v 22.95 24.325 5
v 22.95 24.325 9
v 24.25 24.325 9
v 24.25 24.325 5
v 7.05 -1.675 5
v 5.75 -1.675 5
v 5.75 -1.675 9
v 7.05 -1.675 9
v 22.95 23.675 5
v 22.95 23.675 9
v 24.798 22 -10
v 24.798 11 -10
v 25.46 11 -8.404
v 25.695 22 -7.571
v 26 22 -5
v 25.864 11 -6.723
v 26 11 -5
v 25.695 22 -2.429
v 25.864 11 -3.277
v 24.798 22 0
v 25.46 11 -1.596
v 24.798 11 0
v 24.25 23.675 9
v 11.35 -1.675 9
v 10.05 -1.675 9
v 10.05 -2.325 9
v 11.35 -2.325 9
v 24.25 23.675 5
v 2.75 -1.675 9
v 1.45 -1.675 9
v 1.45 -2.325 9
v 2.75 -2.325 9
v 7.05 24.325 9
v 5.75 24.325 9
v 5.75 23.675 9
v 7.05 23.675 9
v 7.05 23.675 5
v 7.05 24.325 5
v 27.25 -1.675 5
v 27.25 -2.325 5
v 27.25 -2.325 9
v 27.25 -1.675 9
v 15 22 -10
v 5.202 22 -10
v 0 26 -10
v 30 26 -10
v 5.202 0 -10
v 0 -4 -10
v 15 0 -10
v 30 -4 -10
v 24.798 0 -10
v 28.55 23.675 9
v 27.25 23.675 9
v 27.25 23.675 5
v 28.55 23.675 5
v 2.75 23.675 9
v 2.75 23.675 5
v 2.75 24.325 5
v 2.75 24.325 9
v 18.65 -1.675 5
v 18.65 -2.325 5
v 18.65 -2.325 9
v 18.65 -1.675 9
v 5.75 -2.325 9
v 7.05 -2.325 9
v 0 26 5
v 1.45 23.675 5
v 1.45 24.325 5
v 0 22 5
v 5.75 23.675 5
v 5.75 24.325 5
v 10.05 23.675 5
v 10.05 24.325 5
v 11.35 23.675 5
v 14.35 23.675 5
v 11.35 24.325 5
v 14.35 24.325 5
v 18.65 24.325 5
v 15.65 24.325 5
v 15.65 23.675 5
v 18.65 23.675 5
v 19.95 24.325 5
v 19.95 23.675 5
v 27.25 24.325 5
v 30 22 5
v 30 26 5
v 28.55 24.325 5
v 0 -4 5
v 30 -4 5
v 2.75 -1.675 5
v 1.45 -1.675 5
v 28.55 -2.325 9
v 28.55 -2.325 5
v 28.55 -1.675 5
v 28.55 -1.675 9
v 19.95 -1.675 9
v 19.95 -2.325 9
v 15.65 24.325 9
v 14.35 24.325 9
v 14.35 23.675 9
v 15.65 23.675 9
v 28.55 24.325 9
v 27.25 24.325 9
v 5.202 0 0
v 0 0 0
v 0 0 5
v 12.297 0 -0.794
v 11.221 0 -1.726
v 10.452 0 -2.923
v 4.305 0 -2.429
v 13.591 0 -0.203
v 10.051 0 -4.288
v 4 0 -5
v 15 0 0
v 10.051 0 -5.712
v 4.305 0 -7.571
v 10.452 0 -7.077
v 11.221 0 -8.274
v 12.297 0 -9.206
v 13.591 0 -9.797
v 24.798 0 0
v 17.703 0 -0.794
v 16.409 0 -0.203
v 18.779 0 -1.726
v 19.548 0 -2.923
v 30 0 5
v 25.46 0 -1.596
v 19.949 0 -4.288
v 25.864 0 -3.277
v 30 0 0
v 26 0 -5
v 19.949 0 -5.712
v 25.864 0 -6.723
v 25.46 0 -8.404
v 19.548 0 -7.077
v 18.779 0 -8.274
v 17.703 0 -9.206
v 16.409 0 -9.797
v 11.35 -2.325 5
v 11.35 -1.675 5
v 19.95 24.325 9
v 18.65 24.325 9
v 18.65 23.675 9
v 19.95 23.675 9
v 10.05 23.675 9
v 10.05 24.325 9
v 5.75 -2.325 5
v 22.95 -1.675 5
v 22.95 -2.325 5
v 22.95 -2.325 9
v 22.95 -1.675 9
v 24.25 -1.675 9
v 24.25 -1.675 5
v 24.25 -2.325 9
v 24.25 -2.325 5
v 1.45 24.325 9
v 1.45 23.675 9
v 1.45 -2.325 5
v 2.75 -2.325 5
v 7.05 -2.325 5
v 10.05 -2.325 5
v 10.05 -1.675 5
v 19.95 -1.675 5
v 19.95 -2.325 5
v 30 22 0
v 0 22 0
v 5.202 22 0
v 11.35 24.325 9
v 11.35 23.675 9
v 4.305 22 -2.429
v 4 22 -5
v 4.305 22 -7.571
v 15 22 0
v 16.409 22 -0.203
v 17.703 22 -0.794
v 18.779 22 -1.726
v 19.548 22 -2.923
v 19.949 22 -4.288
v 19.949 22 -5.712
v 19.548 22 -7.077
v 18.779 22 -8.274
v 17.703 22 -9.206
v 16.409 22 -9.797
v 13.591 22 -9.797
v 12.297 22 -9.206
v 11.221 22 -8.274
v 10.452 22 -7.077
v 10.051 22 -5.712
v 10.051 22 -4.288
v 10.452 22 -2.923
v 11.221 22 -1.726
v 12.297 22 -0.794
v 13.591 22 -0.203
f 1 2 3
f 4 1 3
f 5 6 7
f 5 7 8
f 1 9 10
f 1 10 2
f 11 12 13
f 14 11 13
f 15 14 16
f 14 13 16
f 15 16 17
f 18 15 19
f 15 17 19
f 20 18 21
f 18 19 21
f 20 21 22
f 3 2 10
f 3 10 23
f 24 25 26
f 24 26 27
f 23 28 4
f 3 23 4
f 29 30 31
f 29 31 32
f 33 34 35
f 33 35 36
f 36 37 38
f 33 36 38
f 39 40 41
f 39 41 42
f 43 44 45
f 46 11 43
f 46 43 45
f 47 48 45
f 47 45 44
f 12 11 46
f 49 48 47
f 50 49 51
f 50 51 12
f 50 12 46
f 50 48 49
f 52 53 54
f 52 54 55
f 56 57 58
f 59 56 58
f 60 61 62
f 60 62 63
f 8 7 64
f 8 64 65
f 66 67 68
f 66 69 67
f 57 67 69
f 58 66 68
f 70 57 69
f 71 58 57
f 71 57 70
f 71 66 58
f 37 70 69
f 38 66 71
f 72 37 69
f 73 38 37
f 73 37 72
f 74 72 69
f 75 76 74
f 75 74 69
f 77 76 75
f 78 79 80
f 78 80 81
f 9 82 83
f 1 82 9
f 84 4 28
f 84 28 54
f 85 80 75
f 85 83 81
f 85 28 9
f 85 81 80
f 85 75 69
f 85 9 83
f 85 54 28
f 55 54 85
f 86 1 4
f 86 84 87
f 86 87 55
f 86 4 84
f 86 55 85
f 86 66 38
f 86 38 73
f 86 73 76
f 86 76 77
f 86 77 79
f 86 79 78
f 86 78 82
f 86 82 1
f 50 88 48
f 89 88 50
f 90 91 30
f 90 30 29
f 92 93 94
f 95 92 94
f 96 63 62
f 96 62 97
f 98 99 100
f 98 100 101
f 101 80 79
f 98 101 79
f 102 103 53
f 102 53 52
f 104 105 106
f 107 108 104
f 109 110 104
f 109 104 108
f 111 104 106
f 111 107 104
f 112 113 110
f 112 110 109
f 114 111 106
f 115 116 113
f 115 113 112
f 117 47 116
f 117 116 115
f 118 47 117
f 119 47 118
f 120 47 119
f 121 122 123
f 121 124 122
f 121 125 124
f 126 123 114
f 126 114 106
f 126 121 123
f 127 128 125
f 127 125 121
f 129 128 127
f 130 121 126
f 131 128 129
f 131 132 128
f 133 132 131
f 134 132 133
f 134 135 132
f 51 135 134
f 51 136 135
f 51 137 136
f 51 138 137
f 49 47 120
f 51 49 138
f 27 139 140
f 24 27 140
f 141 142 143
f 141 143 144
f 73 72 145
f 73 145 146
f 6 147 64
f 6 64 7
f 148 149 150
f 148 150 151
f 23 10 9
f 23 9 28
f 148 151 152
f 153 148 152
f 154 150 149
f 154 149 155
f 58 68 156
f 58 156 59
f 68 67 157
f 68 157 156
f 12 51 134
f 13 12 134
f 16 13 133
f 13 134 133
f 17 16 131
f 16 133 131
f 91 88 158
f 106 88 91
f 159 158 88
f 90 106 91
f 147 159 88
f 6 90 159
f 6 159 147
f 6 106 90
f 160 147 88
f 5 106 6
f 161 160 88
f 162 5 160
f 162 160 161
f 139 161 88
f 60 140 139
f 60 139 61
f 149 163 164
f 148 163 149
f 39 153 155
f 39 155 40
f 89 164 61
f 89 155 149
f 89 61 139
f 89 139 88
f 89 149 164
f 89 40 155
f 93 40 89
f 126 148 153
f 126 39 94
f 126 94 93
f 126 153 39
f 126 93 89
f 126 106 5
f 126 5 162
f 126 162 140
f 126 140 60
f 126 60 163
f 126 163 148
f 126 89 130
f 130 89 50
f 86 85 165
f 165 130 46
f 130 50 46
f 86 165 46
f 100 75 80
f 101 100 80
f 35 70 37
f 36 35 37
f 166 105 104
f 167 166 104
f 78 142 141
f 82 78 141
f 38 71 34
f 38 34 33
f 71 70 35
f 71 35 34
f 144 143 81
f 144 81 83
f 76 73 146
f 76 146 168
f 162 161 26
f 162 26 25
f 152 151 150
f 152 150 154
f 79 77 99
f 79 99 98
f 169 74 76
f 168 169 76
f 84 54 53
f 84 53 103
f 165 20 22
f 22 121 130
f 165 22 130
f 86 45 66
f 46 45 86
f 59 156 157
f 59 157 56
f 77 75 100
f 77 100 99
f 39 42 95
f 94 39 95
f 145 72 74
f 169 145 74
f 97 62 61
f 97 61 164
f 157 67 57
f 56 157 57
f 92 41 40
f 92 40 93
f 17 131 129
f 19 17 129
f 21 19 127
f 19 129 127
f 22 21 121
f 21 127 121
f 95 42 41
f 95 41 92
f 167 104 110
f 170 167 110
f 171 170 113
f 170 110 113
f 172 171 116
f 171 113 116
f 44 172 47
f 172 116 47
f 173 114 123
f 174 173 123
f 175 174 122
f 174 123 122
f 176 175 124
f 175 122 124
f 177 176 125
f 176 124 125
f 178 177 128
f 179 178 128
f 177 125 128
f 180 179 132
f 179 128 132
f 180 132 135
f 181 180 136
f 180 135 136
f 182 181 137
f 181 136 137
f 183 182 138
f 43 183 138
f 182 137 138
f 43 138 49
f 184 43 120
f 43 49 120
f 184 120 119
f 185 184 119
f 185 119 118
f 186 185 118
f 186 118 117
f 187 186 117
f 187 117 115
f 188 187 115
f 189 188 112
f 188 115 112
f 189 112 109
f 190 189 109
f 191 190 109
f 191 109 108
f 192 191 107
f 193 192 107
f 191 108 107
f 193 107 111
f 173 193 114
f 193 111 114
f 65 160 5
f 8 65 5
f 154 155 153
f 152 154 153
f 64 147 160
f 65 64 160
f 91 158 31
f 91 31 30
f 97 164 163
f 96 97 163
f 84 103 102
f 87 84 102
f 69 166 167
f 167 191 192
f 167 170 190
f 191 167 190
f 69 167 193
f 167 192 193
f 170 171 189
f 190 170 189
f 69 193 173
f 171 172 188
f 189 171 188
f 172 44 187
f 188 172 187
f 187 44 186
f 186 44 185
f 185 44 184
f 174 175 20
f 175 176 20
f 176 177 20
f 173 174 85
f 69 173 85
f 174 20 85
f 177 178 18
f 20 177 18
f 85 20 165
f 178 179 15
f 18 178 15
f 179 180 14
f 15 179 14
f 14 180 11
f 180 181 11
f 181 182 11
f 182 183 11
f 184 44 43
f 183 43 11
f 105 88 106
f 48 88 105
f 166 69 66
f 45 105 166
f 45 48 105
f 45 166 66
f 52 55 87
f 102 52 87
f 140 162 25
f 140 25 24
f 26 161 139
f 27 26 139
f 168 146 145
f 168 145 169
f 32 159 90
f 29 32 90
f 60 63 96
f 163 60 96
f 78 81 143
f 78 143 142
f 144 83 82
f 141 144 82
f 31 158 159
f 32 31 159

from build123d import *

# Parameters (mm, degrees)
EXTRUDE_1_DEPTH   = 11
SKETCH_1_R        = 5
EXTRUDE_1_2_DEPTH = 11
EXTRUDE_1_3_DEPTH = 11
SKETCH_2_W        = 30
SKETCH_2_H        = 10
EXTRUDE_2_DEPTH   = 4
SKETCH_3_R        = 5
EXTRUDE_3_DEPTH   = 11
SKETCH_4_W        = 30
SKETCH_4_H        = 10
EXTRUDE_4_DEPTH   = 4
SKETCH_5_W        = 30
SKETCH_5_H        = 4
EXTRUDE_5_DEPTH   = 5
SKETCH_6_W        = 1.3
SKETCH_6_H        = 0.65
EXTRUDE_6_DEPTH   = 4


with BuildPart() as part:
    # Эскиз1 → Бобышка-Вытянуть1 (new body)
    with BuildSketch(Plane(origin=(0, 0, 0), x_dir=(1, 0, 0), z_dir=(0, 1, 0))):
        with BuildLine():
            Line((0, 10), (0, 0))
            Line((0, 0), (5.202041029, 0))
            ThreePointArc((5.202041029, 0), (4, 5), (5.202041029, 10))
            Line((5.202041029, 10), (0, 10))
        make_face()
    extrude(amount=EXTRUDE_1_DEPTH)



with BuildPart() as body_2:
    # Эскиз1 → Extrude 1 2 (new body)
    with BuildSketch(Plane(origin=(0, 0, 0), x_dir=(1, 0, 0), z_dir=(0, 1, 0))):
        with Locations(Location((15, 5, 0), (0, 0, 270))):
            Circle(SKETCH_1_R)
    extrude(amount=EXTRUDE_1_2_DEPTH)


with BuildPart() as body_3:
    # Эскиз1 → Extrude 1 3 (new body)
    with BuildSketch(Plane(origin=(0, 0, 0), x_dir=(1, 0, 0), z_dir=(0, 1, 0))):
        with BuildLine():
            ThreePointArc((26, 5), (25.695268783, 2.428769622), (24.797958971, 0))
            Line((24.797958971, 0), (30, 0))
            Line((30, 0), (30, 10))
            Line((30, 10), (24.797958971, 10))
            ThreePointArc((24.797958971, 10), (25.695268783, 7.571230378), (26, 5))
        make_face()
    extrude(amount=EXTRUDE_1_3_DEPTH)


with BuildPart() as part_1:
    add(part.part)

    add(body_2.part)  # Бобышка-Вытянуть2 merges body 2

    add(body_3.part)  # Бобышка-Вытянуть2 merges body 3
    # Эскиз2 → Бобышка-Вытянуть2 (add)
    with BuildSketch(Plane.XZ):
        with Locations((15, -5)):
            Rectangle(SKETCH_2_W, SKETCH_2_H)
    extrude(amount=EXTRUDE_2_DEPTH)

    # Эскиз3 → Бобышка-Вытянуть3 (add)
    with BuildSketch(Plane(origin=(0, 11, 0), x_dir=(1, 0, 0), z_dir=(0, 1, 0))):
        with Locations(Location((15, 5, 0), (0, 0, 270))):
            Circle(SKETCH_3_R)
        with BuildLine():
            Line((24.797958971, 0), (30, 0))
            Line((30, 0), (30, 10))
            Line((30, 10), (24.797958971, 10))
            ThreePointArc((24.797958971, 10), (26, 5), (24.797958971, 0))
        make_face()
        with BuildLine():
            Line((5.202041029, 10), (0, 10))
            Line((0, 10), (0, 0))
            Line((0, 0), (5.202041029, 0))
            ThreePointArc((5.202041029, 0), (4, 5), (5.202041029, 10))
        make_face()
    extrude(amount=EXTRUDE_3_DEPTH)

    # Эскиз4 → Бобышка-Вытянуть4 (add)
    with BuildSketch(Plane(origin=(0, 22, 0), x_dir=(1, 0, 0), z_dir=(0, 1, 0))):
        with Locations((15, 5)):
            Rectangle(SKETCH_4_W, SKETCH_4_H)
    extrude(amount=EXTRUDE_4_DEPTH)

    # Эскиз5 → Бобышка-Вытянуть5 (add)
    with BuildSketch(Plane.XY):
        with Locations((15, 24)):
            Rectangle(SKETCH_5_W, SKETCH_5_H)
        with Locations((15, -2)):
            Rectangle(SKETCH_5_W, SKETCH_5_H)
    extrude(amount=EXTRUDE_5_DEPTH)

    # Эскиз6 → Бобышка-Вытянуть6 (add)
    with BuildSketch(Plane.XY.offset(5)):
        with Locations((6.4, 24)):
            Rectangle(SKETCH_6_W, SKETCH_6_H)
        with Locations((2.1, 24)):
            Rectangle(SKETCH_6_W, SKETCH_6_H)
        with Locations((10.7, 24)):
            Rectangle(SKETCH_6_W, SKETCH_6_H)
        with Locations((15, 24)):
            Rectangle(SKETCH_6_W, SKETCH_6_H)
        with Locations((19.3, 24)):
            Rectangle(SKETCH_6_W, SKETCH_6_H)
        with Locations((23.6, 24)):
            Rectangle(SKETCH_6_W, SKETCH_6_H)
        with Locations((27.9, 24)):
            Rectangle(SKETCH_6_W, SKETCH_6_H)
        with Locations((6.4, -2)):
            Rectangle(SKETCH_6_W, SKETCH_6_H)
        with Locations((2.1, -2)):
            Rectangle(SKETCH_6_W, SKETCH_6_H)
        with Locations((10.7, -2)):
            Rectangle(SKETCH_6_W, SKETCH_6_H)
        with Locations((23.6, -2)):
            Rectangle(SKETCH_6_W, SKETCH_6_H)
        with Locations((19.3, -2)):
            Rectangle(SKETCH_6_W, SKETCH_6_H)
        with Locations((27.9, -2)):
            Rectangle(SKETCH_6_W, SKETCH_6_H)
    extrude(amount=EXTRUDE_6_DEPTH)


solid = part_1.part
